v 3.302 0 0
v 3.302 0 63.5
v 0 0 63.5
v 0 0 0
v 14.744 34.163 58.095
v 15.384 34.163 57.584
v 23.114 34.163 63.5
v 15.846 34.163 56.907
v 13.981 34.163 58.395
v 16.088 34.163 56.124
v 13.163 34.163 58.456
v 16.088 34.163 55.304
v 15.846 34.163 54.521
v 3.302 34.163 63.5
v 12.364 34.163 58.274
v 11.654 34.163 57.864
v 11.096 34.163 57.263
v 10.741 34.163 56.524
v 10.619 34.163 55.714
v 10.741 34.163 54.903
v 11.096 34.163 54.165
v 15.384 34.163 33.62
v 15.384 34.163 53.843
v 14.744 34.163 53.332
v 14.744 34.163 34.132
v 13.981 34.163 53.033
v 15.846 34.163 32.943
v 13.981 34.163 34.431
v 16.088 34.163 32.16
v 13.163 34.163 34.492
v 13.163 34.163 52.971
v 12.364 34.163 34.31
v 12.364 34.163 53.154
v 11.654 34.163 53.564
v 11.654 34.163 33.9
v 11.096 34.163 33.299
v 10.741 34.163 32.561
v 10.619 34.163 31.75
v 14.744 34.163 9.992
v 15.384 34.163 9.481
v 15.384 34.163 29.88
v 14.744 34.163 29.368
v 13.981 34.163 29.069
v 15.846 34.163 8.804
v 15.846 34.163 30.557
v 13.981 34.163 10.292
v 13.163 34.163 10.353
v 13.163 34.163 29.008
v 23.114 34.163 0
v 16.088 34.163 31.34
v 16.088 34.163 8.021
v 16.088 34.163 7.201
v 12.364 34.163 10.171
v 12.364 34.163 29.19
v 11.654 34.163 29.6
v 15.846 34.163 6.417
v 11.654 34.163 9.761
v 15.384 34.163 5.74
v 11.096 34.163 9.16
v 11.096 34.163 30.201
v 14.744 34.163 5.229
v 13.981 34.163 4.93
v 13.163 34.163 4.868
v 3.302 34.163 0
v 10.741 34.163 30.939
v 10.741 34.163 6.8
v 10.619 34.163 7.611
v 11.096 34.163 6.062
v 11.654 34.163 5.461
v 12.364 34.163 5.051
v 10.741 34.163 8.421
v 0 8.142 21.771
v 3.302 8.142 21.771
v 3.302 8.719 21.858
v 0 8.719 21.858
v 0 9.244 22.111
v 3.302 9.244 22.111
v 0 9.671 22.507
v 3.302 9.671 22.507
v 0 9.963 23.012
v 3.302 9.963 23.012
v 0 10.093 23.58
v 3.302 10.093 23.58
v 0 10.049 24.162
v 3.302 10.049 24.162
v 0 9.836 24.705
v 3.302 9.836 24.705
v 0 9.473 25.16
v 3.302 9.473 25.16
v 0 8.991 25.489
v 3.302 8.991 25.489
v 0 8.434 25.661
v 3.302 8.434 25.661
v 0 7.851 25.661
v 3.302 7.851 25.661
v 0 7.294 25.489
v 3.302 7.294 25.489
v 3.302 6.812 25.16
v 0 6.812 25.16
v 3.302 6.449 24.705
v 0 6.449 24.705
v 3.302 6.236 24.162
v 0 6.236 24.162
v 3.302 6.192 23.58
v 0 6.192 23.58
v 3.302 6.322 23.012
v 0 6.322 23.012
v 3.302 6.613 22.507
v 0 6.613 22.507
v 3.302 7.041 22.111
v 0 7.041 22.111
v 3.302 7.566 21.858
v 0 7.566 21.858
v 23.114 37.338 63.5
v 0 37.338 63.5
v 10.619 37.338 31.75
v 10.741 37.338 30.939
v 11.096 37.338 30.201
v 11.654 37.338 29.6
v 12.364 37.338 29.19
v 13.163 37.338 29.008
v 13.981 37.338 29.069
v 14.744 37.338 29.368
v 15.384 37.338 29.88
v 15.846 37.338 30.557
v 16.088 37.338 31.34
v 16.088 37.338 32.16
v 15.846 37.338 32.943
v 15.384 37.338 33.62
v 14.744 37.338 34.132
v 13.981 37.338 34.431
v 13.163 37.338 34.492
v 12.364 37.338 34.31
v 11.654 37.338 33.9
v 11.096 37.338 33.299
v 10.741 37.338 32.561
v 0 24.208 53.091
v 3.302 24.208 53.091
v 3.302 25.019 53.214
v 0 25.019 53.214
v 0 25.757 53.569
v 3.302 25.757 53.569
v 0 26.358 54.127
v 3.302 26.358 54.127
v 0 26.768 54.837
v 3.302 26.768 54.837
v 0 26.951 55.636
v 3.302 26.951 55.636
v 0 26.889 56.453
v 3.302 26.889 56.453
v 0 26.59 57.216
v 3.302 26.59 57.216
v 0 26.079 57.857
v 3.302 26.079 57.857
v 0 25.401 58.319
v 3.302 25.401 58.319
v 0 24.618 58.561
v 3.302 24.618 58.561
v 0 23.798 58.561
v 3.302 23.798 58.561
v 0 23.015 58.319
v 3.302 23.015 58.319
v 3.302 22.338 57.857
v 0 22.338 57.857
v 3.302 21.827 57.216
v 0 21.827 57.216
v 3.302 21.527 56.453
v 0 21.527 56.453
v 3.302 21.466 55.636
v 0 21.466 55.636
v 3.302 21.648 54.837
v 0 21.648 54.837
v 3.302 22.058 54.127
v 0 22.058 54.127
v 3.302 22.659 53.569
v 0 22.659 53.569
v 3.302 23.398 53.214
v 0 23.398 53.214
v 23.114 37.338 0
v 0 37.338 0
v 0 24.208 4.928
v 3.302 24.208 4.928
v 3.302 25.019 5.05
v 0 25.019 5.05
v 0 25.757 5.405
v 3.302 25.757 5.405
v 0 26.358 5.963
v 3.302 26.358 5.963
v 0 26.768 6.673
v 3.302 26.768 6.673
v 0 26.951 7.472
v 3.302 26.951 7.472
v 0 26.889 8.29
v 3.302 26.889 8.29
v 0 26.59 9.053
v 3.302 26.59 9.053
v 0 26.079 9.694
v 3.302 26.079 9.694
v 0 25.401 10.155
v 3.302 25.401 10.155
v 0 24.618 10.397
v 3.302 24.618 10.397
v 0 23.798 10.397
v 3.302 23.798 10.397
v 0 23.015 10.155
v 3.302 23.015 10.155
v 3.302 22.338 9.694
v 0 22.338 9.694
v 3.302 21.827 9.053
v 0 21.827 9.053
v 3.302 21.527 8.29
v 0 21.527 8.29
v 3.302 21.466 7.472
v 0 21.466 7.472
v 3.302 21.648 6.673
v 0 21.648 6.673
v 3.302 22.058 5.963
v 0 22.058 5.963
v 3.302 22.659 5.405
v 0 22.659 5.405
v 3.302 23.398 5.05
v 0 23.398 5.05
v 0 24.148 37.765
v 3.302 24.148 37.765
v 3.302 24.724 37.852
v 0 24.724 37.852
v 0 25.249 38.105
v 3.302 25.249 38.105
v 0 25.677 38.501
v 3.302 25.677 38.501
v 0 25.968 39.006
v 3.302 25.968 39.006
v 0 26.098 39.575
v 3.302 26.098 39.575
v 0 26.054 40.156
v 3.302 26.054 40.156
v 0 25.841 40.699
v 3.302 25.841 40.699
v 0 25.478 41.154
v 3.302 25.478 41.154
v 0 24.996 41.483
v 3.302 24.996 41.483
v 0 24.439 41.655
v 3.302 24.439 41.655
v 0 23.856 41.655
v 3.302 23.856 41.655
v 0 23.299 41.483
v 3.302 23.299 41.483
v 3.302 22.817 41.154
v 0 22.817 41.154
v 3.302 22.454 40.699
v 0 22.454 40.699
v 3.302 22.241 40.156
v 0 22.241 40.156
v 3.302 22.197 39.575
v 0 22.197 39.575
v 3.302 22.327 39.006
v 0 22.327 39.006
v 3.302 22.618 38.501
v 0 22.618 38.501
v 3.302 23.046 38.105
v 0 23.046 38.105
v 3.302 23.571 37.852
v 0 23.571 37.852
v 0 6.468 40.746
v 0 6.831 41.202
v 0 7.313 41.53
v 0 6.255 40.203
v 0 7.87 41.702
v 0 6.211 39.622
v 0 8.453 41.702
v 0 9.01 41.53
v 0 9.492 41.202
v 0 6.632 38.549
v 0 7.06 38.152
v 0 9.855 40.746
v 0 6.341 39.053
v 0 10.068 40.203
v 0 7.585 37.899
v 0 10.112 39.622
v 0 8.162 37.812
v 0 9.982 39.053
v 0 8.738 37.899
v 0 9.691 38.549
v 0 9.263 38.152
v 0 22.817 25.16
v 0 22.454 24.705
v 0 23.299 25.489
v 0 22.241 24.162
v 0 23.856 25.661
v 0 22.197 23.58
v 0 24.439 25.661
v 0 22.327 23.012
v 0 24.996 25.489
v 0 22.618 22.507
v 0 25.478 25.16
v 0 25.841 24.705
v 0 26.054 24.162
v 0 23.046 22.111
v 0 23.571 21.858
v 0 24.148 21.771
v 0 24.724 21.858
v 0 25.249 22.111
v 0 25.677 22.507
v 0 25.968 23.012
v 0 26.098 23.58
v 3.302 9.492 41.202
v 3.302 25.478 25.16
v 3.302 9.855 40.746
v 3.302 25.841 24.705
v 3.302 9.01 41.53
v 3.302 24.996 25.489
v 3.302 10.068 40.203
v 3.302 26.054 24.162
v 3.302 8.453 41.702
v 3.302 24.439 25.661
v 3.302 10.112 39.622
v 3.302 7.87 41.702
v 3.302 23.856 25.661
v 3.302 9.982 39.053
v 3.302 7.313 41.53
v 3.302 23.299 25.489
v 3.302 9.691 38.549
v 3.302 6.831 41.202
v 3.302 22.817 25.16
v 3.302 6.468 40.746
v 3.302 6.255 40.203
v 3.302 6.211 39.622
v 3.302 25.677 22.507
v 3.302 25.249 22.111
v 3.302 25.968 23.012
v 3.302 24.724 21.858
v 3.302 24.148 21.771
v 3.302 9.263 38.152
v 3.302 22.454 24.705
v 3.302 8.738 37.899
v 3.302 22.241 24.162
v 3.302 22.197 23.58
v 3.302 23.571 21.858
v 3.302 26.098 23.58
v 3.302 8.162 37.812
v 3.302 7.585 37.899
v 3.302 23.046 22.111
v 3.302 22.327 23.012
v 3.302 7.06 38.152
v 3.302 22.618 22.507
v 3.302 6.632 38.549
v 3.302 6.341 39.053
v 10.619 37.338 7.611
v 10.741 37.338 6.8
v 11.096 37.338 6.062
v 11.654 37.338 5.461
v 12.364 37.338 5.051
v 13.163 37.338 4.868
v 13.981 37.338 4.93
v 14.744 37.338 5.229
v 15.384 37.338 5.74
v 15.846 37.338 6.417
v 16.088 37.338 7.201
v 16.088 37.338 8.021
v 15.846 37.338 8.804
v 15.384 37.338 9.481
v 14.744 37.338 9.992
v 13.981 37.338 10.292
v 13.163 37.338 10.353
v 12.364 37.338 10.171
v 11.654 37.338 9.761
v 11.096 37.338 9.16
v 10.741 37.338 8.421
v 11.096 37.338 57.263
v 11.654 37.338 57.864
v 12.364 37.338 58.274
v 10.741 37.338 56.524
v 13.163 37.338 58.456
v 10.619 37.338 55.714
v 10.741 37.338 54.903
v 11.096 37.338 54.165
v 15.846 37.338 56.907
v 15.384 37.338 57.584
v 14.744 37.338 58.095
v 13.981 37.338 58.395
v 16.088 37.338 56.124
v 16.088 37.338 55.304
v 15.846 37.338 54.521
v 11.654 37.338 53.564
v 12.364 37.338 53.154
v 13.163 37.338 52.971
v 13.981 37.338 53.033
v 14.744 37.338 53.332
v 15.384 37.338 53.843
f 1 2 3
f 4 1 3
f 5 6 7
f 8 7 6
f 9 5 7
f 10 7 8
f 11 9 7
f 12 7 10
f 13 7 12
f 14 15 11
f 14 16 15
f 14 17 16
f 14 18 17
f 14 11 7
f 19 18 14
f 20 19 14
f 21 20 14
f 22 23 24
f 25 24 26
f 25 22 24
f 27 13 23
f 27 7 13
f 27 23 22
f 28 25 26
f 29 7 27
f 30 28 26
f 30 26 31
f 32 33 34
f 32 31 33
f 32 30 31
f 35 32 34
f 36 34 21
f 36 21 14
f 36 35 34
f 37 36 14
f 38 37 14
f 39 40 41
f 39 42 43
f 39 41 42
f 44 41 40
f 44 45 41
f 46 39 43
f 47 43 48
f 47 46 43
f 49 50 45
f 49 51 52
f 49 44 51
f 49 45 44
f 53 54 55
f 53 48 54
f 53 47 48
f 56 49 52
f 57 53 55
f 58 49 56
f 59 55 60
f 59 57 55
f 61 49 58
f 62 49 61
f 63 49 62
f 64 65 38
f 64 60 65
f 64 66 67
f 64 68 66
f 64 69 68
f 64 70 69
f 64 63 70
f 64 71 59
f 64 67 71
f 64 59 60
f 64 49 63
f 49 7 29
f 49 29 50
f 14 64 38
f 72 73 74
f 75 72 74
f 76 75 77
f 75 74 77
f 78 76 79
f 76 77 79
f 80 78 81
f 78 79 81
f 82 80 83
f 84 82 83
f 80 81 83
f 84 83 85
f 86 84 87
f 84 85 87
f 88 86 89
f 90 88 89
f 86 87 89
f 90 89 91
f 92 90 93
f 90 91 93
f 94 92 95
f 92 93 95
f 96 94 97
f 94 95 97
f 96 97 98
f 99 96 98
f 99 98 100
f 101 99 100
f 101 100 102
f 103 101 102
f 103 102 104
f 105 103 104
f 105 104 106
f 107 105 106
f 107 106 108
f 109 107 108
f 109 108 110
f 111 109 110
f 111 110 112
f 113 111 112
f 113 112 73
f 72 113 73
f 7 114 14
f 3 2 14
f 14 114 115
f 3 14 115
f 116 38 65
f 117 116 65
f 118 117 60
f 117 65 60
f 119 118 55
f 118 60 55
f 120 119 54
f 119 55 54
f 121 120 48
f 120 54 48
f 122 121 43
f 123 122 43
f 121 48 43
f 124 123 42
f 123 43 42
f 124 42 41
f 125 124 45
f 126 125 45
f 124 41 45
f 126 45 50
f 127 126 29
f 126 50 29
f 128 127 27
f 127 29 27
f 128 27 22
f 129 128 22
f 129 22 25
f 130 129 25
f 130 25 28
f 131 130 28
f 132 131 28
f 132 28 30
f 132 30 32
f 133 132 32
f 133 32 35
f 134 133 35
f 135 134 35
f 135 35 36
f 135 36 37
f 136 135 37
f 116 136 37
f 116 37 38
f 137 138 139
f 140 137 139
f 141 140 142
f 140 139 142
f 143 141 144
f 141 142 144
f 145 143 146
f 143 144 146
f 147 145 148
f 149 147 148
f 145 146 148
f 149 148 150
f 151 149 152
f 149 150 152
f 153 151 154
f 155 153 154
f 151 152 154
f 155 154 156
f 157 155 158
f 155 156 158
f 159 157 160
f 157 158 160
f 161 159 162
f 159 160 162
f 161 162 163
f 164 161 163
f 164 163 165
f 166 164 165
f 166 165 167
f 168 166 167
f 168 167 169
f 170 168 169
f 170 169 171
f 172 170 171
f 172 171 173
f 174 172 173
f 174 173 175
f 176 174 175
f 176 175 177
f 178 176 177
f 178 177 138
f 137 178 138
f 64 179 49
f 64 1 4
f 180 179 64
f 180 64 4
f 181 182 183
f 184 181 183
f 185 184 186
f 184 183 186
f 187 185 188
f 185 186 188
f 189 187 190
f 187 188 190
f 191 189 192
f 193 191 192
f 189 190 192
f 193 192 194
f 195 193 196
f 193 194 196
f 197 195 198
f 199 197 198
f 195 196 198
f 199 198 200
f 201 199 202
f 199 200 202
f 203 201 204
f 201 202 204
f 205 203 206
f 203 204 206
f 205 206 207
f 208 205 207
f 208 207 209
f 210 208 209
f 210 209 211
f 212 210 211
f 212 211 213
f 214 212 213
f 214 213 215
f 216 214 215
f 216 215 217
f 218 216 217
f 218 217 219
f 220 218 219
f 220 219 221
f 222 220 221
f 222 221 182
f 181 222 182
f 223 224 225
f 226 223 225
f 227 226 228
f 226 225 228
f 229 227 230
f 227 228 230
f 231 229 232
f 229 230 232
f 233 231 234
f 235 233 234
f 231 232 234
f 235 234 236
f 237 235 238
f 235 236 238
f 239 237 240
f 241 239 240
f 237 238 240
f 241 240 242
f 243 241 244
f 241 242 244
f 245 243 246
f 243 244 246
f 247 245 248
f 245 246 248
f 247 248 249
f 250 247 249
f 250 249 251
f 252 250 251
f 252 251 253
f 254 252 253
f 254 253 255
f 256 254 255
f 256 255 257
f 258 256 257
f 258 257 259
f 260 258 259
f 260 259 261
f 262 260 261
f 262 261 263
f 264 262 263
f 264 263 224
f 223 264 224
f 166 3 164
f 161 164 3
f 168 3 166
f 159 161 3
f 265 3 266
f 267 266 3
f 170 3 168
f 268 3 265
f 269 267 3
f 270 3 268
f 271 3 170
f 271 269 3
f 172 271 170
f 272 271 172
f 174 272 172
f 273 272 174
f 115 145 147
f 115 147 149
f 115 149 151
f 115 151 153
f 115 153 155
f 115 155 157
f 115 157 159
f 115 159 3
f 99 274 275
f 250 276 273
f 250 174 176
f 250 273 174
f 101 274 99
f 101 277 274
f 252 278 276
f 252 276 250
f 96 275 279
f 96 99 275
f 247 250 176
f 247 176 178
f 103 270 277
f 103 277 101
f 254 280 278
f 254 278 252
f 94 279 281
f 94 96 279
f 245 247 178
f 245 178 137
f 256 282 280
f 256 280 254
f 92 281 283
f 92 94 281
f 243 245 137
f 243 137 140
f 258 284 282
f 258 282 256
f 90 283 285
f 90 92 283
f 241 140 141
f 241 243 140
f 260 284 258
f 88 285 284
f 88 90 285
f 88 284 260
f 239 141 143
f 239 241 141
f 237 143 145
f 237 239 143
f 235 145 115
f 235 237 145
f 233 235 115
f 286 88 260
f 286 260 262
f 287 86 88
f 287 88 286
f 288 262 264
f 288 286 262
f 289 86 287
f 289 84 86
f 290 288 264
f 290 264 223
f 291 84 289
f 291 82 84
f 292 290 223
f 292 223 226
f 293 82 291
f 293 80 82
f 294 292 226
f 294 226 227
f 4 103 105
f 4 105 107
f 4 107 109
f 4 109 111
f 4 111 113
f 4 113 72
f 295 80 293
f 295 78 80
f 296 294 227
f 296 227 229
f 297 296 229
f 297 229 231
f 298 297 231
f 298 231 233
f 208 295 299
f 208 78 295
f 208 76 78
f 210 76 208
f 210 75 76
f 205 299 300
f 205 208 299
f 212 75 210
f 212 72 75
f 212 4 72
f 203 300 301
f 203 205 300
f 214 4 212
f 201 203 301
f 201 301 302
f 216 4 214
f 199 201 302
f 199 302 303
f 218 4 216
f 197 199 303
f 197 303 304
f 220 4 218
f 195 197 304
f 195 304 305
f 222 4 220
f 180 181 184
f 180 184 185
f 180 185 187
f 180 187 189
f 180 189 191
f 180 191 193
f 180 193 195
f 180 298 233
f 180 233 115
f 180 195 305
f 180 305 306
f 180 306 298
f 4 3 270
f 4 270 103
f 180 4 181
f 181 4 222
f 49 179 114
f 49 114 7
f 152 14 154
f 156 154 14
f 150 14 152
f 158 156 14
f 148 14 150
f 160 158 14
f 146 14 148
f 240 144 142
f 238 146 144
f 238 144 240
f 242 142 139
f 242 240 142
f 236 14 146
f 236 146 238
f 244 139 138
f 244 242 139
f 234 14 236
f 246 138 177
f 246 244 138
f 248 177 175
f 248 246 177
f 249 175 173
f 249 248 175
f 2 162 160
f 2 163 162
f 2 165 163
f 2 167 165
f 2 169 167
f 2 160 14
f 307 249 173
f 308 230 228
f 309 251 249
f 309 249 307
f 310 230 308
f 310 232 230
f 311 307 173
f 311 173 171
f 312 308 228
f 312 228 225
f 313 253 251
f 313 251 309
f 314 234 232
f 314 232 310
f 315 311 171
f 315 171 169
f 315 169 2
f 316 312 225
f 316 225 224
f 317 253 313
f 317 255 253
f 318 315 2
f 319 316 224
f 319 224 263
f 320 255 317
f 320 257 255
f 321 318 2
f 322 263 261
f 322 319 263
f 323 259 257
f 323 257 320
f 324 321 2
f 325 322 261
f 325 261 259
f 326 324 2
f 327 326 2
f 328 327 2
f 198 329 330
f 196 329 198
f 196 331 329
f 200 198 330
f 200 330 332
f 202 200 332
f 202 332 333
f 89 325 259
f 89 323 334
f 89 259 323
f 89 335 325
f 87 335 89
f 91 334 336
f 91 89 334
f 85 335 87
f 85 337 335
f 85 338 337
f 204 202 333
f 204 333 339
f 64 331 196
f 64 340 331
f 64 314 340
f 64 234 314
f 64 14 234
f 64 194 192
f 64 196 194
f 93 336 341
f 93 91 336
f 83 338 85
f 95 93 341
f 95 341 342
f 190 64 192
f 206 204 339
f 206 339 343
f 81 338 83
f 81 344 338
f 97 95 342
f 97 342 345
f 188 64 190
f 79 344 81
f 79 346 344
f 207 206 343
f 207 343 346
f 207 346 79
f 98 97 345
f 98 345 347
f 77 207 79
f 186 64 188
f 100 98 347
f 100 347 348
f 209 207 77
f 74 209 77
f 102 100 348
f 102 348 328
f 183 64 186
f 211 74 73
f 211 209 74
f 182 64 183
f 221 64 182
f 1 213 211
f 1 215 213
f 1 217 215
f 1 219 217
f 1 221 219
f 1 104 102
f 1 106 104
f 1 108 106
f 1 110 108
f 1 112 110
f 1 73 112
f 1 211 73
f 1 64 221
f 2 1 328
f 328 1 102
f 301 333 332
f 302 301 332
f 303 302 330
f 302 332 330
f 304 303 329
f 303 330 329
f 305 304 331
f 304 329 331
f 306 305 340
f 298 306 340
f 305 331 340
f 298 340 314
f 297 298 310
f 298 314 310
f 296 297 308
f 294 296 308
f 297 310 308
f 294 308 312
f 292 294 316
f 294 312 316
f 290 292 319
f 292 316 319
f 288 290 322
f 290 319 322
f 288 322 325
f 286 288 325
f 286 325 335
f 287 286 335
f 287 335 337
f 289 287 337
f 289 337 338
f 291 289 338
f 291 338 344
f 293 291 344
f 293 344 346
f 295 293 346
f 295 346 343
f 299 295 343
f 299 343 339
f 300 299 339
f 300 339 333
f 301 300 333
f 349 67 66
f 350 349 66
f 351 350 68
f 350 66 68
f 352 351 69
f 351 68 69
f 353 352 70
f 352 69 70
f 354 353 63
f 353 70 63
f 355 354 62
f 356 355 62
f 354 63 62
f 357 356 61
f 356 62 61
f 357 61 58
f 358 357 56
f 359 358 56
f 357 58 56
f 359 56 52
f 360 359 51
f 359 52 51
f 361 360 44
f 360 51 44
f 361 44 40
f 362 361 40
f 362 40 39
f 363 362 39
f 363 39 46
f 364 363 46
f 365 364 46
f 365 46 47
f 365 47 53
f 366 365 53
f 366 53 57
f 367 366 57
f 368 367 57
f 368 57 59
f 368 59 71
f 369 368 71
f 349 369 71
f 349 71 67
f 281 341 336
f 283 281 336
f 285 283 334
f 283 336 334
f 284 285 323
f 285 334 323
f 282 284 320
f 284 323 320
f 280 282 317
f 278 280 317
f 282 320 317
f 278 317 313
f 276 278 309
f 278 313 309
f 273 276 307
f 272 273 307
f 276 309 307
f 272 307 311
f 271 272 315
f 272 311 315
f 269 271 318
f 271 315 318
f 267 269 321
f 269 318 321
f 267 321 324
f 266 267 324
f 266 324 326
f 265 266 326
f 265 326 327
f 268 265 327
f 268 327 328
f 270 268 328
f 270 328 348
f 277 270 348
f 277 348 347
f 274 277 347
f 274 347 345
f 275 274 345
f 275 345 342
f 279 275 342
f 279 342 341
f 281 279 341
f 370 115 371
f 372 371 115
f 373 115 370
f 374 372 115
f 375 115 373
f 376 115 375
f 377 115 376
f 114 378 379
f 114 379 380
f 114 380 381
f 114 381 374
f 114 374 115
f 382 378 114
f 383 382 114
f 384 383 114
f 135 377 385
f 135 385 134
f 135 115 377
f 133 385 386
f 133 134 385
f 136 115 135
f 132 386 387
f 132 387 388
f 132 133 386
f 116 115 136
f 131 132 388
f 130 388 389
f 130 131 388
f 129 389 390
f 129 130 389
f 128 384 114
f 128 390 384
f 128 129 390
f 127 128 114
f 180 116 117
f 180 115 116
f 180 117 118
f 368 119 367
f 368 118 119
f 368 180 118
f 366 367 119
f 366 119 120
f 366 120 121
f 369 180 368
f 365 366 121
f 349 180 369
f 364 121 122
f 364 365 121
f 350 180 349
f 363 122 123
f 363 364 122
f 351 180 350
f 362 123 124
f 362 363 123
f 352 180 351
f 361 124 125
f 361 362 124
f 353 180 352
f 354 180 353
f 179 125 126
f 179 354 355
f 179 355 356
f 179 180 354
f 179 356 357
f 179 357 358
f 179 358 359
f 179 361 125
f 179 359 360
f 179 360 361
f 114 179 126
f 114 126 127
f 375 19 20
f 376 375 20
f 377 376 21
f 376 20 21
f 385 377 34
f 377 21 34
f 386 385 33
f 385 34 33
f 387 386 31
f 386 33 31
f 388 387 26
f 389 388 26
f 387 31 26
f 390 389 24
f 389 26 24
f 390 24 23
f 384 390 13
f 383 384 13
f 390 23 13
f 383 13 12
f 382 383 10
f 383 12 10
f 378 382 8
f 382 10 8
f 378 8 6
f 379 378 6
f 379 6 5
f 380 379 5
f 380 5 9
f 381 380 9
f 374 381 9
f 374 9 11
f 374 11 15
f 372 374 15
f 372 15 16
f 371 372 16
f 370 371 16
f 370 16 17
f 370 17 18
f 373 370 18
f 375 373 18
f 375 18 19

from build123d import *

# Parameters (mm, degrees)
BOSS_EXTRUDE1_DEPTH         = 63.5
M5_CLEARANCE_HOLE1_D        = 5.5
M5_CLEARANCE_HOLE2_D        = 5.5
M5_CLEARANCE_HOLE3_D        = 5.5
M5_CLEARANCE_HOLE4_D        = 5.5
F_23_0_154_DIAMETER_HOLE1_D = 3.9116
M5_CLEARANCE_HOLE5_D        = 5.5


with BuildPart() as part:
    # Sketch1 → Boss-Extrude1 (new body)
    with BuildSketch(Plane.XY):
        Polygon((0, 0), (0, 37.338), (23.114, 37.338), (23.114, 34.163), (3.302, 34.163), (3.302, 0), align=None)
    extrude(amount=BOSS_EXTRUDE1_DEPTH)

    # M5 Clearance Hole1 (through all)
    with Locations(Plane.ZY):
        with Locations((55.84134748, 24.208221519)):
            Hole(M5_CLEARANCE_HOLE1_D / 2)

    # M5 Clearance Hole2 (through all)
    with Locations(Plane.ZY):
        with Locations((7.677638483, 24.208221519)):
            Hole(M5_CLEARANCE_HOLE2_D / 2)

    # M5 Clearance Hole3 (through all)
    with Locations(Plane(origin=(0, 37.338, 0), x_dir=(1, 0, 0), z_dir=(0, 1, 0))):
        with Locations((13.368582087, -31.75)):
            Hole(M5_CLEARANCE_HOLE3_D / 2)

    # M5 Clearance Hole4 (through all)
    with Locations(Plane(origin=(0, 37.338, 0), x_dir=(1, 0, 0), z_dir=(0, 1, 0))):
        with Locations((13.368582087, -55.713693276)):
            Hole(M5_CLEARANCE_HOLE4_D / 2)

    # #23 (0.154) Diameter Hole1 (through all)
    with Locations(Plane.ZY):
        with Locations((39.767961445, 8.161533304), (23.72660366, 8.142354774), (23.72660366, 24.147573359), (39.720778954, 24.147573359)):
            Hole(F_23_0_154_DIAMETER_HOLE1_D / 2)

    # M5 Clearance Hole5 (through all)
    with Locations(Plane(origin=(0, 37.338, 0), x_dir=(1, 0, 0), z_dir=(0, 1, 0))):
        with Locations((13.368582087, -7.610649616)):
            Hole(M5_CLEARANCE_HOLE5_D / 2)


solid = part.part
